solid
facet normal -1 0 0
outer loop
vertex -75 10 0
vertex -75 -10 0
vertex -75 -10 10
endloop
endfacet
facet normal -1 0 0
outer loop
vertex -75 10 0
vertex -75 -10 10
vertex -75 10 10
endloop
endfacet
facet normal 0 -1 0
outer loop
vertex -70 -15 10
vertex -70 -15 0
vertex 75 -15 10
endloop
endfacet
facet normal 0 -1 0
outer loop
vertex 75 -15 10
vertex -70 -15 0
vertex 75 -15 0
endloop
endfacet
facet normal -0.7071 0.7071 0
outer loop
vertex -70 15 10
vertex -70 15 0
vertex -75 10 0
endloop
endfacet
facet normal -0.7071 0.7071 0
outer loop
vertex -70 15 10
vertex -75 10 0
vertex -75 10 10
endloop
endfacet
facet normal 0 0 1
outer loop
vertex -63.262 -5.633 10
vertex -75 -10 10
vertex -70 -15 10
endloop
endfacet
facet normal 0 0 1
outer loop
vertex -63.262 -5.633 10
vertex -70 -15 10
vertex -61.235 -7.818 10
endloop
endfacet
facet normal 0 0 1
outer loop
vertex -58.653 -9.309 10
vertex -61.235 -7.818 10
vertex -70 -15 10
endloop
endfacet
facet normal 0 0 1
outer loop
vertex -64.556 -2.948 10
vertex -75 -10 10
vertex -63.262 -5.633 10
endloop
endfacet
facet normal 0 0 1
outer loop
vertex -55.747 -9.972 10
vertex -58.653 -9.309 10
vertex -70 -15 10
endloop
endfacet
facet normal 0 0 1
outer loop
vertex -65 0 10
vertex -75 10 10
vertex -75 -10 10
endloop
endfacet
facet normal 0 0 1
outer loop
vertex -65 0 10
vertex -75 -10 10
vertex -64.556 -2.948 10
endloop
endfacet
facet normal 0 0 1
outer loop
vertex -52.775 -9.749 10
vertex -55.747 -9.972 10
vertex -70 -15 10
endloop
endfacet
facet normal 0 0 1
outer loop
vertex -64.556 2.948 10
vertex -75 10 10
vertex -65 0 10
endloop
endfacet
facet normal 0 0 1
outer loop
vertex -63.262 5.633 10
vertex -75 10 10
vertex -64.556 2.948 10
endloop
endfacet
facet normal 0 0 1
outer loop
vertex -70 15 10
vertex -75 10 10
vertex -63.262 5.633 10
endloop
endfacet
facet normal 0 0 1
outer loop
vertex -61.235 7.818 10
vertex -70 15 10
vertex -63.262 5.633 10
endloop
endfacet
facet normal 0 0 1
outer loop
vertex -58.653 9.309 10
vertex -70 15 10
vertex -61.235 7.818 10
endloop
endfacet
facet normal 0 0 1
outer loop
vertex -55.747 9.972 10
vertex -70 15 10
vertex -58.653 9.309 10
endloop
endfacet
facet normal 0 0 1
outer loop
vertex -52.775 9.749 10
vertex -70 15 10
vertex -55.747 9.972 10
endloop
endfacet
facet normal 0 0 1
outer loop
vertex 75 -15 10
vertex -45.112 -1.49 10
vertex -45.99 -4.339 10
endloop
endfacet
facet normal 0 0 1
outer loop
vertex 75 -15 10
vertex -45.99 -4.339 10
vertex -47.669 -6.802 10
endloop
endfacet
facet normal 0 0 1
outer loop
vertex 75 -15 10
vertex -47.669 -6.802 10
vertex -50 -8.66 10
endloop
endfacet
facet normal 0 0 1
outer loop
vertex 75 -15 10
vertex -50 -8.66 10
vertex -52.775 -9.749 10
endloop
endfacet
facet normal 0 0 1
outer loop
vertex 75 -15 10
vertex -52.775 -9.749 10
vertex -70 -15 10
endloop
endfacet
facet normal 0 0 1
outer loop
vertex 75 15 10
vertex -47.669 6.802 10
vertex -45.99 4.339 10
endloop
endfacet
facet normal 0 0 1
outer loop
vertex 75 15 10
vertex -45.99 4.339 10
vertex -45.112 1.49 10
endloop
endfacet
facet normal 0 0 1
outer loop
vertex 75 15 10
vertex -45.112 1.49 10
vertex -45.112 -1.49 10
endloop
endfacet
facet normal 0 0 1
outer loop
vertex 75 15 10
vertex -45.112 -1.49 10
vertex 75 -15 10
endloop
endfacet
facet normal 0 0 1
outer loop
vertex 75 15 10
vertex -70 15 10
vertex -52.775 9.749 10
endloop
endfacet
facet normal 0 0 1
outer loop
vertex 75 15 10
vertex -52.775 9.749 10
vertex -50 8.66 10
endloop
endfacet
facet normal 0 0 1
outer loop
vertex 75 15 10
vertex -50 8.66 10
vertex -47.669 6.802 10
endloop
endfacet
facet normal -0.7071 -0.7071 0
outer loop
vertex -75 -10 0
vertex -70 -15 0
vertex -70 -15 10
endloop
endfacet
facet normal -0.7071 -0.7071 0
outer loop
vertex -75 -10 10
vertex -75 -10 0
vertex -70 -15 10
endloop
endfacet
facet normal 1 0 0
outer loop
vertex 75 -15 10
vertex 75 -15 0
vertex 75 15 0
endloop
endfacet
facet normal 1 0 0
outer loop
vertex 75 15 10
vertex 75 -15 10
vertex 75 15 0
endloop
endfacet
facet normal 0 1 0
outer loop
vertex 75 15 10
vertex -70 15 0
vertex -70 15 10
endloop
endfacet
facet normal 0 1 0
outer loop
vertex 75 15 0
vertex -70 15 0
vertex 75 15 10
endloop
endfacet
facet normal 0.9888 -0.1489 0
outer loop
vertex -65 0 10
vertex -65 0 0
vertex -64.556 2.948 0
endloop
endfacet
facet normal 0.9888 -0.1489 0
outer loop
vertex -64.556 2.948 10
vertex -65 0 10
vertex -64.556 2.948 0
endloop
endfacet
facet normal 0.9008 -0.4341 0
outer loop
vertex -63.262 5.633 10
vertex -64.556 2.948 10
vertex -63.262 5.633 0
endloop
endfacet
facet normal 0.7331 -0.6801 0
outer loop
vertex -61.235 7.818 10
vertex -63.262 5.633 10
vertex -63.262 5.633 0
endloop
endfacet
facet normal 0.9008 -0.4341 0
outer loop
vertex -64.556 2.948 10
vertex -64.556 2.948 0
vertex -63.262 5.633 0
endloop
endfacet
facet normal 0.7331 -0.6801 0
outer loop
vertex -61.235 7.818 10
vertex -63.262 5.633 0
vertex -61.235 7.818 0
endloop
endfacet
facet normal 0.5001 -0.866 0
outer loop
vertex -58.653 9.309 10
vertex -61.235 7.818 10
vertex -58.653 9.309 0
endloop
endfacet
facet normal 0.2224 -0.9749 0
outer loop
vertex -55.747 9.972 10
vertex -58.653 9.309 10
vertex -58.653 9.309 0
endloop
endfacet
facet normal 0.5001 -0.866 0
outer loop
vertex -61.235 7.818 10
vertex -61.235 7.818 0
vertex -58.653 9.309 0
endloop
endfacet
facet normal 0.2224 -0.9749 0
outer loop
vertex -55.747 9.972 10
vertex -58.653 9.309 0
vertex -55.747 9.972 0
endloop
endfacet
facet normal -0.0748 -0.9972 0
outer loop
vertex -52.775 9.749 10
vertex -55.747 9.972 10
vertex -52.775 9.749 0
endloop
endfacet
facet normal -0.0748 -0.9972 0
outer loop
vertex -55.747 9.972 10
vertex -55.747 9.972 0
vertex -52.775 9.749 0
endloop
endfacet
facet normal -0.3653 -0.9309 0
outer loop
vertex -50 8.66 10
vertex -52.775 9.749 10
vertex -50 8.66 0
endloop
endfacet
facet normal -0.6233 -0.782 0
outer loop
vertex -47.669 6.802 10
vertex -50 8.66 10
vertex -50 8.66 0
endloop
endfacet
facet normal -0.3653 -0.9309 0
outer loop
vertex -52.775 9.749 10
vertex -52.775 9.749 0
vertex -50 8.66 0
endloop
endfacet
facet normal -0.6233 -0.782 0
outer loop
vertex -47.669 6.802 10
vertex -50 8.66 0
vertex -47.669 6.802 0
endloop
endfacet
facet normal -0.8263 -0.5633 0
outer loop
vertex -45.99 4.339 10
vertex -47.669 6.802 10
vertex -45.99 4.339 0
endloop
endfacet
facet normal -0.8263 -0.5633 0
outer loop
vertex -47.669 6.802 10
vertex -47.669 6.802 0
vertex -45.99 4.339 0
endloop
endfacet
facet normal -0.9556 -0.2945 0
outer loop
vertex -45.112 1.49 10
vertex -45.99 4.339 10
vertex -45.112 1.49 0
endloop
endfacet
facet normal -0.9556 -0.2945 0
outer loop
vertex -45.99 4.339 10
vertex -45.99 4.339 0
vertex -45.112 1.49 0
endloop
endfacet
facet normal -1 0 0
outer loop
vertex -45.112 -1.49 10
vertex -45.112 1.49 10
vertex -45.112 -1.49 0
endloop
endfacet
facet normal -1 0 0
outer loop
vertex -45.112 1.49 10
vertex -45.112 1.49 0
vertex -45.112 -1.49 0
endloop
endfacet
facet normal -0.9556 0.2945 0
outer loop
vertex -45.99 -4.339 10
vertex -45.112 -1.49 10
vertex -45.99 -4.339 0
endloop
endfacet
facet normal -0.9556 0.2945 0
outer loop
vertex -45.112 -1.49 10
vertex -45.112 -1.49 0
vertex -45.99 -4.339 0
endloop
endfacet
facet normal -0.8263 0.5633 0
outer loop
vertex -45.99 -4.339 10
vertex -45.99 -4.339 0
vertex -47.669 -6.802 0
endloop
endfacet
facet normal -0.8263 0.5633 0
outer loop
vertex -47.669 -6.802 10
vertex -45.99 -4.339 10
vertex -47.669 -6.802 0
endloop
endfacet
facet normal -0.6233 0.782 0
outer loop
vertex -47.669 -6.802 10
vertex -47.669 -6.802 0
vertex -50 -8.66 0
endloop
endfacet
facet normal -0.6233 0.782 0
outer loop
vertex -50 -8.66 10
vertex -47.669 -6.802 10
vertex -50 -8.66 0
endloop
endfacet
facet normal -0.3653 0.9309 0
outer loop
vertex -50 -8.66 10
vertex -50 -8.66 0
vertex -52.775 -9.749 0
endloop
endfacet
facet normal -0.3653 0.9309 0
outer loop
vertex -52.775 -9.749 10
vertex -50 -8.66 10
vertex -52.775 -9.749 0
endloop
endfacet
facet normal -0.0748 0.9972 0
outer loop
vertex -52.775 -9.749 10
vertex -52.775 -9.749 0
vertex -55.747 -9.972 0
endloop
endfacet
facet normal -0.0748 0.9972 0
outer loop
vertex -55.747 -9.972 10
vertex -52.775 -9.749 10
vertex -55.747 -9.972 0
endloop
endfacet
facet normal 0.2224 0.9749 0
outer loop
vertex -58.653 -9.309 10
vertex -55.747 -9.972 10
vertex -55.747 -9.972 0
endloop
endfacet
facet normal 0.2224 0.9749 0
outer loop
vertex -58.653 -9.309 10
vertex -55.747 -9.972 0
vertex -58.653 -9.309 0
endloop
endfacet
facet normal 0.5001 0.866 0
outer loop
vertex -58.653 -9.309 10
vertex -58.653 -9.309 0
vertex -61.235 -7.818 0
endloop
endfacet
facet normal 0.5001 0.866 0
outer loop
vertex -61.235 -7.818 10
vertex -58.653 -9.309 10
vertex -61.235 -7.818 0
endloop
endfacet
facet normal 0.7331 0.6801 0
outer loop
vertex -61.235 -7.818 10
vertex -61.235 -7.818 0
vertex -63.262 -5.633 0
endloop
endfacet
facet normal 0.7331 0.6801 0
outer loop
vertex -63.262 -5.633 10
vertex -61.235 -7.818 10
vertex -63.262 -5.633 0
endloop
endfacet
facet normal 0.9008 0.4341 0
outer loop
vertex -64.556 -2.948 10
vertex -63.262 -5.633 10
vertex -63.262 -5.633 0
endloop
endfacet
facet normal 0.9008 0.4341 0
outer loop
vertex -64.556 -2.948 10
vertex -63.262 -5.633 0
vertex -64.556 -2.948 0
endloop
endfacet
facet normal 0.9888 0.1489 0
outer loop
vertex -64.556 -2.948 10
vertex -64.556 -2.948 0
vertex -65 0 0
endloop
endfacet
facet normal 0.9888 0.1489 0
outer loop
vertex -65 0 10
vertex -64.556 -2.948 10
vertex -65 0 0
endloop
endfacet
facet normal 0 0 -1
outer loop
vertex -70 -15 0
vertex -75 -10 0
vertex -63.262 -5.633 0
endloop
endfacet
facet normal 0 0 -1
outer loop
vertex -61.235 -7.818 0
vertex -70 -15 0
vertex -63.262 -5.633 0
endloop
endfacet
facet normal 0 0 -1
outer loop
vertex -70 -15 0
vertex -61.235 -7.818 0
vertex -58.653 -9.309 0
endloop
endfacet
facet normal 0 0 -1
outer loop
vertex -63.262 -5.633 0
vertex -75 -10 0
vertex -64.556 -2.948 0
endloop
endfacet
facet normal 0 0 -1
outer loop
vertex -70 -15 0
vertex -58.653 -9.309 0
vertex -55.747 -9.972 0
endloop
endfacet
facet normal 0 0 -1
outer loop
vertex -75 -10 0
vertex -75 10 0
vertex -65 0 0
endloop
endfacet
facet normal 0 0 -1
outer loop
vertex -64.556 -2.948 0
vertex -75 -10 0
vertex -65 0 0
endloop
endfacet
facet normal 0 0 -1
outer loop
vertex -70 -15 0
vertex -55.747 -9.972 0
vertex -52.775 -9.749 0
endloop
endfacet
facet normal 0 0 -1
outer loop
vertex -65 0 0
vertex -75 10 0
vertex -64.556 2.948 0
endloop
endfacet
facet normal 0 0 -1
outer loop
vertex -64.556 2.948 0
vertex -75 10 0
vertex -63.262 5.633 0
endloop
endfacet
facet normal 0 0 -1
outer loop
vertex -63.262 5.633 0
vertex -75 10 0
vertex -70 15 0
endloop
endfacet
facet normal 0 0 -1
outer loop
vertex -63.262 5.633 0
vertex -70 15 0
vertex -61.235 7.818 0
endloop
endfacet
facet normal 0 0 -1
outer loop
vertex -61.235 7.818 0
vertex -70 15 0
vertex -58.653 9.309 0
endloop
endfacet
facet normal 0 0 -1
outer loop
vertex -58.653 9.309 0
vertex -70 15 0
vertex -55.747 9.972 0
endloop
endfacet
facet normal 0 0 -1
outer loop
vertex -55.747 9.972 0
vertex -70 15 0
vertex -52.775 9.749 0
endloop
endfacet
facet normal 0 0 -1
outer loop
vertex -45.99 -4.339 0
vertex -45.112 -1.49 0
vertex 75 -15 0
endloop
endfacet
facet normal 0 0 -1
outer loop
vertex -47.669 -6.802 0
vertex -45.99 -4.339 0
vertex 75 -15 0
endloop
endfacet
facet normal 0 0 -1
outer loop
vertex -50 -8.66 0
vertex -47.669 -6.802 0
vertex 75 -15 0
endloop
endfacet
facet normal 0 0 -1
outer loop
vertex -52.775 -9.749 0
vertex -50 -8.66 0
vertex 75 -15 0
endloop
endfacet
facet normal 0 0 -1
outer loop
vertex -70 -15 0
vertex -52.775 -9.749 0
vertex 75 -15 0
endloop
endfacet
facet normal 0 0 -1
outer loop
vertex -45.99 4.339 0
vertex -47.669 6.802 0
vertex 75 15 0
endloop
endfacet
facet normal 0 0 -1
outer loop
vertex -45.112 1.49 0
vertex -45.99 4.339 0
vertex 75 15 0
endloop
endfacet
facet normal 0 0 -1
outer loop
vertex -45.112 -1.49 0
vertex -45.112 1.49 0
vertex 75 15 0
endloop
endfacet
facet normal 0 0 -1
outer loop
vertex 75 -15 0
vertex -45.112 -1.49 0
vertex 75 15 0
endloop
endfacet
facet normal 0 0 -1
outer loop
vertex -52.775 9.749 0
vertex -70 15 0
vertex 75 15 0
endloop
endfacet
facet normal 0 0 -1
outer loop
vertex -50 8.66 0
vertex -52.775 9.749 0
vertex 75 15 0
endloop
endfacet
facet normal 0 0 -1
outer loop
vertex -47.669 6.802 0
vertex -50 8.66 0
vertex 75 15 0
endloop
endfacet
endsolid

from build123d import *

# Parameters (mm, degrees)
F0_W     = 150
F0_H     = 30
F1_DEPTH = 10
F3_D     = 20
F4_SIZE  = 5


with BuildPart() as f1:
    # F0 (on Top) → F1 (new body)
    with BuildSketch(Plane.XY):
        Rectangle(F0_W, F0_H)
    extrude(amount=F1_DEPTH)

    # F3 (through all)
    with Locations(Plane.XY.offset(10)):
        with Locations((-55, 0)):
            Hole(F3_D / 2)

    # F4
    f4_edges = [f1.edges().sort_by_distance(p)[0] for p in [
        (-75, -15, 5),
        (-75, 15, 5),
    ]]
    chamfer(f4_edges, length=F4_SIZE)


solid = f1.part
